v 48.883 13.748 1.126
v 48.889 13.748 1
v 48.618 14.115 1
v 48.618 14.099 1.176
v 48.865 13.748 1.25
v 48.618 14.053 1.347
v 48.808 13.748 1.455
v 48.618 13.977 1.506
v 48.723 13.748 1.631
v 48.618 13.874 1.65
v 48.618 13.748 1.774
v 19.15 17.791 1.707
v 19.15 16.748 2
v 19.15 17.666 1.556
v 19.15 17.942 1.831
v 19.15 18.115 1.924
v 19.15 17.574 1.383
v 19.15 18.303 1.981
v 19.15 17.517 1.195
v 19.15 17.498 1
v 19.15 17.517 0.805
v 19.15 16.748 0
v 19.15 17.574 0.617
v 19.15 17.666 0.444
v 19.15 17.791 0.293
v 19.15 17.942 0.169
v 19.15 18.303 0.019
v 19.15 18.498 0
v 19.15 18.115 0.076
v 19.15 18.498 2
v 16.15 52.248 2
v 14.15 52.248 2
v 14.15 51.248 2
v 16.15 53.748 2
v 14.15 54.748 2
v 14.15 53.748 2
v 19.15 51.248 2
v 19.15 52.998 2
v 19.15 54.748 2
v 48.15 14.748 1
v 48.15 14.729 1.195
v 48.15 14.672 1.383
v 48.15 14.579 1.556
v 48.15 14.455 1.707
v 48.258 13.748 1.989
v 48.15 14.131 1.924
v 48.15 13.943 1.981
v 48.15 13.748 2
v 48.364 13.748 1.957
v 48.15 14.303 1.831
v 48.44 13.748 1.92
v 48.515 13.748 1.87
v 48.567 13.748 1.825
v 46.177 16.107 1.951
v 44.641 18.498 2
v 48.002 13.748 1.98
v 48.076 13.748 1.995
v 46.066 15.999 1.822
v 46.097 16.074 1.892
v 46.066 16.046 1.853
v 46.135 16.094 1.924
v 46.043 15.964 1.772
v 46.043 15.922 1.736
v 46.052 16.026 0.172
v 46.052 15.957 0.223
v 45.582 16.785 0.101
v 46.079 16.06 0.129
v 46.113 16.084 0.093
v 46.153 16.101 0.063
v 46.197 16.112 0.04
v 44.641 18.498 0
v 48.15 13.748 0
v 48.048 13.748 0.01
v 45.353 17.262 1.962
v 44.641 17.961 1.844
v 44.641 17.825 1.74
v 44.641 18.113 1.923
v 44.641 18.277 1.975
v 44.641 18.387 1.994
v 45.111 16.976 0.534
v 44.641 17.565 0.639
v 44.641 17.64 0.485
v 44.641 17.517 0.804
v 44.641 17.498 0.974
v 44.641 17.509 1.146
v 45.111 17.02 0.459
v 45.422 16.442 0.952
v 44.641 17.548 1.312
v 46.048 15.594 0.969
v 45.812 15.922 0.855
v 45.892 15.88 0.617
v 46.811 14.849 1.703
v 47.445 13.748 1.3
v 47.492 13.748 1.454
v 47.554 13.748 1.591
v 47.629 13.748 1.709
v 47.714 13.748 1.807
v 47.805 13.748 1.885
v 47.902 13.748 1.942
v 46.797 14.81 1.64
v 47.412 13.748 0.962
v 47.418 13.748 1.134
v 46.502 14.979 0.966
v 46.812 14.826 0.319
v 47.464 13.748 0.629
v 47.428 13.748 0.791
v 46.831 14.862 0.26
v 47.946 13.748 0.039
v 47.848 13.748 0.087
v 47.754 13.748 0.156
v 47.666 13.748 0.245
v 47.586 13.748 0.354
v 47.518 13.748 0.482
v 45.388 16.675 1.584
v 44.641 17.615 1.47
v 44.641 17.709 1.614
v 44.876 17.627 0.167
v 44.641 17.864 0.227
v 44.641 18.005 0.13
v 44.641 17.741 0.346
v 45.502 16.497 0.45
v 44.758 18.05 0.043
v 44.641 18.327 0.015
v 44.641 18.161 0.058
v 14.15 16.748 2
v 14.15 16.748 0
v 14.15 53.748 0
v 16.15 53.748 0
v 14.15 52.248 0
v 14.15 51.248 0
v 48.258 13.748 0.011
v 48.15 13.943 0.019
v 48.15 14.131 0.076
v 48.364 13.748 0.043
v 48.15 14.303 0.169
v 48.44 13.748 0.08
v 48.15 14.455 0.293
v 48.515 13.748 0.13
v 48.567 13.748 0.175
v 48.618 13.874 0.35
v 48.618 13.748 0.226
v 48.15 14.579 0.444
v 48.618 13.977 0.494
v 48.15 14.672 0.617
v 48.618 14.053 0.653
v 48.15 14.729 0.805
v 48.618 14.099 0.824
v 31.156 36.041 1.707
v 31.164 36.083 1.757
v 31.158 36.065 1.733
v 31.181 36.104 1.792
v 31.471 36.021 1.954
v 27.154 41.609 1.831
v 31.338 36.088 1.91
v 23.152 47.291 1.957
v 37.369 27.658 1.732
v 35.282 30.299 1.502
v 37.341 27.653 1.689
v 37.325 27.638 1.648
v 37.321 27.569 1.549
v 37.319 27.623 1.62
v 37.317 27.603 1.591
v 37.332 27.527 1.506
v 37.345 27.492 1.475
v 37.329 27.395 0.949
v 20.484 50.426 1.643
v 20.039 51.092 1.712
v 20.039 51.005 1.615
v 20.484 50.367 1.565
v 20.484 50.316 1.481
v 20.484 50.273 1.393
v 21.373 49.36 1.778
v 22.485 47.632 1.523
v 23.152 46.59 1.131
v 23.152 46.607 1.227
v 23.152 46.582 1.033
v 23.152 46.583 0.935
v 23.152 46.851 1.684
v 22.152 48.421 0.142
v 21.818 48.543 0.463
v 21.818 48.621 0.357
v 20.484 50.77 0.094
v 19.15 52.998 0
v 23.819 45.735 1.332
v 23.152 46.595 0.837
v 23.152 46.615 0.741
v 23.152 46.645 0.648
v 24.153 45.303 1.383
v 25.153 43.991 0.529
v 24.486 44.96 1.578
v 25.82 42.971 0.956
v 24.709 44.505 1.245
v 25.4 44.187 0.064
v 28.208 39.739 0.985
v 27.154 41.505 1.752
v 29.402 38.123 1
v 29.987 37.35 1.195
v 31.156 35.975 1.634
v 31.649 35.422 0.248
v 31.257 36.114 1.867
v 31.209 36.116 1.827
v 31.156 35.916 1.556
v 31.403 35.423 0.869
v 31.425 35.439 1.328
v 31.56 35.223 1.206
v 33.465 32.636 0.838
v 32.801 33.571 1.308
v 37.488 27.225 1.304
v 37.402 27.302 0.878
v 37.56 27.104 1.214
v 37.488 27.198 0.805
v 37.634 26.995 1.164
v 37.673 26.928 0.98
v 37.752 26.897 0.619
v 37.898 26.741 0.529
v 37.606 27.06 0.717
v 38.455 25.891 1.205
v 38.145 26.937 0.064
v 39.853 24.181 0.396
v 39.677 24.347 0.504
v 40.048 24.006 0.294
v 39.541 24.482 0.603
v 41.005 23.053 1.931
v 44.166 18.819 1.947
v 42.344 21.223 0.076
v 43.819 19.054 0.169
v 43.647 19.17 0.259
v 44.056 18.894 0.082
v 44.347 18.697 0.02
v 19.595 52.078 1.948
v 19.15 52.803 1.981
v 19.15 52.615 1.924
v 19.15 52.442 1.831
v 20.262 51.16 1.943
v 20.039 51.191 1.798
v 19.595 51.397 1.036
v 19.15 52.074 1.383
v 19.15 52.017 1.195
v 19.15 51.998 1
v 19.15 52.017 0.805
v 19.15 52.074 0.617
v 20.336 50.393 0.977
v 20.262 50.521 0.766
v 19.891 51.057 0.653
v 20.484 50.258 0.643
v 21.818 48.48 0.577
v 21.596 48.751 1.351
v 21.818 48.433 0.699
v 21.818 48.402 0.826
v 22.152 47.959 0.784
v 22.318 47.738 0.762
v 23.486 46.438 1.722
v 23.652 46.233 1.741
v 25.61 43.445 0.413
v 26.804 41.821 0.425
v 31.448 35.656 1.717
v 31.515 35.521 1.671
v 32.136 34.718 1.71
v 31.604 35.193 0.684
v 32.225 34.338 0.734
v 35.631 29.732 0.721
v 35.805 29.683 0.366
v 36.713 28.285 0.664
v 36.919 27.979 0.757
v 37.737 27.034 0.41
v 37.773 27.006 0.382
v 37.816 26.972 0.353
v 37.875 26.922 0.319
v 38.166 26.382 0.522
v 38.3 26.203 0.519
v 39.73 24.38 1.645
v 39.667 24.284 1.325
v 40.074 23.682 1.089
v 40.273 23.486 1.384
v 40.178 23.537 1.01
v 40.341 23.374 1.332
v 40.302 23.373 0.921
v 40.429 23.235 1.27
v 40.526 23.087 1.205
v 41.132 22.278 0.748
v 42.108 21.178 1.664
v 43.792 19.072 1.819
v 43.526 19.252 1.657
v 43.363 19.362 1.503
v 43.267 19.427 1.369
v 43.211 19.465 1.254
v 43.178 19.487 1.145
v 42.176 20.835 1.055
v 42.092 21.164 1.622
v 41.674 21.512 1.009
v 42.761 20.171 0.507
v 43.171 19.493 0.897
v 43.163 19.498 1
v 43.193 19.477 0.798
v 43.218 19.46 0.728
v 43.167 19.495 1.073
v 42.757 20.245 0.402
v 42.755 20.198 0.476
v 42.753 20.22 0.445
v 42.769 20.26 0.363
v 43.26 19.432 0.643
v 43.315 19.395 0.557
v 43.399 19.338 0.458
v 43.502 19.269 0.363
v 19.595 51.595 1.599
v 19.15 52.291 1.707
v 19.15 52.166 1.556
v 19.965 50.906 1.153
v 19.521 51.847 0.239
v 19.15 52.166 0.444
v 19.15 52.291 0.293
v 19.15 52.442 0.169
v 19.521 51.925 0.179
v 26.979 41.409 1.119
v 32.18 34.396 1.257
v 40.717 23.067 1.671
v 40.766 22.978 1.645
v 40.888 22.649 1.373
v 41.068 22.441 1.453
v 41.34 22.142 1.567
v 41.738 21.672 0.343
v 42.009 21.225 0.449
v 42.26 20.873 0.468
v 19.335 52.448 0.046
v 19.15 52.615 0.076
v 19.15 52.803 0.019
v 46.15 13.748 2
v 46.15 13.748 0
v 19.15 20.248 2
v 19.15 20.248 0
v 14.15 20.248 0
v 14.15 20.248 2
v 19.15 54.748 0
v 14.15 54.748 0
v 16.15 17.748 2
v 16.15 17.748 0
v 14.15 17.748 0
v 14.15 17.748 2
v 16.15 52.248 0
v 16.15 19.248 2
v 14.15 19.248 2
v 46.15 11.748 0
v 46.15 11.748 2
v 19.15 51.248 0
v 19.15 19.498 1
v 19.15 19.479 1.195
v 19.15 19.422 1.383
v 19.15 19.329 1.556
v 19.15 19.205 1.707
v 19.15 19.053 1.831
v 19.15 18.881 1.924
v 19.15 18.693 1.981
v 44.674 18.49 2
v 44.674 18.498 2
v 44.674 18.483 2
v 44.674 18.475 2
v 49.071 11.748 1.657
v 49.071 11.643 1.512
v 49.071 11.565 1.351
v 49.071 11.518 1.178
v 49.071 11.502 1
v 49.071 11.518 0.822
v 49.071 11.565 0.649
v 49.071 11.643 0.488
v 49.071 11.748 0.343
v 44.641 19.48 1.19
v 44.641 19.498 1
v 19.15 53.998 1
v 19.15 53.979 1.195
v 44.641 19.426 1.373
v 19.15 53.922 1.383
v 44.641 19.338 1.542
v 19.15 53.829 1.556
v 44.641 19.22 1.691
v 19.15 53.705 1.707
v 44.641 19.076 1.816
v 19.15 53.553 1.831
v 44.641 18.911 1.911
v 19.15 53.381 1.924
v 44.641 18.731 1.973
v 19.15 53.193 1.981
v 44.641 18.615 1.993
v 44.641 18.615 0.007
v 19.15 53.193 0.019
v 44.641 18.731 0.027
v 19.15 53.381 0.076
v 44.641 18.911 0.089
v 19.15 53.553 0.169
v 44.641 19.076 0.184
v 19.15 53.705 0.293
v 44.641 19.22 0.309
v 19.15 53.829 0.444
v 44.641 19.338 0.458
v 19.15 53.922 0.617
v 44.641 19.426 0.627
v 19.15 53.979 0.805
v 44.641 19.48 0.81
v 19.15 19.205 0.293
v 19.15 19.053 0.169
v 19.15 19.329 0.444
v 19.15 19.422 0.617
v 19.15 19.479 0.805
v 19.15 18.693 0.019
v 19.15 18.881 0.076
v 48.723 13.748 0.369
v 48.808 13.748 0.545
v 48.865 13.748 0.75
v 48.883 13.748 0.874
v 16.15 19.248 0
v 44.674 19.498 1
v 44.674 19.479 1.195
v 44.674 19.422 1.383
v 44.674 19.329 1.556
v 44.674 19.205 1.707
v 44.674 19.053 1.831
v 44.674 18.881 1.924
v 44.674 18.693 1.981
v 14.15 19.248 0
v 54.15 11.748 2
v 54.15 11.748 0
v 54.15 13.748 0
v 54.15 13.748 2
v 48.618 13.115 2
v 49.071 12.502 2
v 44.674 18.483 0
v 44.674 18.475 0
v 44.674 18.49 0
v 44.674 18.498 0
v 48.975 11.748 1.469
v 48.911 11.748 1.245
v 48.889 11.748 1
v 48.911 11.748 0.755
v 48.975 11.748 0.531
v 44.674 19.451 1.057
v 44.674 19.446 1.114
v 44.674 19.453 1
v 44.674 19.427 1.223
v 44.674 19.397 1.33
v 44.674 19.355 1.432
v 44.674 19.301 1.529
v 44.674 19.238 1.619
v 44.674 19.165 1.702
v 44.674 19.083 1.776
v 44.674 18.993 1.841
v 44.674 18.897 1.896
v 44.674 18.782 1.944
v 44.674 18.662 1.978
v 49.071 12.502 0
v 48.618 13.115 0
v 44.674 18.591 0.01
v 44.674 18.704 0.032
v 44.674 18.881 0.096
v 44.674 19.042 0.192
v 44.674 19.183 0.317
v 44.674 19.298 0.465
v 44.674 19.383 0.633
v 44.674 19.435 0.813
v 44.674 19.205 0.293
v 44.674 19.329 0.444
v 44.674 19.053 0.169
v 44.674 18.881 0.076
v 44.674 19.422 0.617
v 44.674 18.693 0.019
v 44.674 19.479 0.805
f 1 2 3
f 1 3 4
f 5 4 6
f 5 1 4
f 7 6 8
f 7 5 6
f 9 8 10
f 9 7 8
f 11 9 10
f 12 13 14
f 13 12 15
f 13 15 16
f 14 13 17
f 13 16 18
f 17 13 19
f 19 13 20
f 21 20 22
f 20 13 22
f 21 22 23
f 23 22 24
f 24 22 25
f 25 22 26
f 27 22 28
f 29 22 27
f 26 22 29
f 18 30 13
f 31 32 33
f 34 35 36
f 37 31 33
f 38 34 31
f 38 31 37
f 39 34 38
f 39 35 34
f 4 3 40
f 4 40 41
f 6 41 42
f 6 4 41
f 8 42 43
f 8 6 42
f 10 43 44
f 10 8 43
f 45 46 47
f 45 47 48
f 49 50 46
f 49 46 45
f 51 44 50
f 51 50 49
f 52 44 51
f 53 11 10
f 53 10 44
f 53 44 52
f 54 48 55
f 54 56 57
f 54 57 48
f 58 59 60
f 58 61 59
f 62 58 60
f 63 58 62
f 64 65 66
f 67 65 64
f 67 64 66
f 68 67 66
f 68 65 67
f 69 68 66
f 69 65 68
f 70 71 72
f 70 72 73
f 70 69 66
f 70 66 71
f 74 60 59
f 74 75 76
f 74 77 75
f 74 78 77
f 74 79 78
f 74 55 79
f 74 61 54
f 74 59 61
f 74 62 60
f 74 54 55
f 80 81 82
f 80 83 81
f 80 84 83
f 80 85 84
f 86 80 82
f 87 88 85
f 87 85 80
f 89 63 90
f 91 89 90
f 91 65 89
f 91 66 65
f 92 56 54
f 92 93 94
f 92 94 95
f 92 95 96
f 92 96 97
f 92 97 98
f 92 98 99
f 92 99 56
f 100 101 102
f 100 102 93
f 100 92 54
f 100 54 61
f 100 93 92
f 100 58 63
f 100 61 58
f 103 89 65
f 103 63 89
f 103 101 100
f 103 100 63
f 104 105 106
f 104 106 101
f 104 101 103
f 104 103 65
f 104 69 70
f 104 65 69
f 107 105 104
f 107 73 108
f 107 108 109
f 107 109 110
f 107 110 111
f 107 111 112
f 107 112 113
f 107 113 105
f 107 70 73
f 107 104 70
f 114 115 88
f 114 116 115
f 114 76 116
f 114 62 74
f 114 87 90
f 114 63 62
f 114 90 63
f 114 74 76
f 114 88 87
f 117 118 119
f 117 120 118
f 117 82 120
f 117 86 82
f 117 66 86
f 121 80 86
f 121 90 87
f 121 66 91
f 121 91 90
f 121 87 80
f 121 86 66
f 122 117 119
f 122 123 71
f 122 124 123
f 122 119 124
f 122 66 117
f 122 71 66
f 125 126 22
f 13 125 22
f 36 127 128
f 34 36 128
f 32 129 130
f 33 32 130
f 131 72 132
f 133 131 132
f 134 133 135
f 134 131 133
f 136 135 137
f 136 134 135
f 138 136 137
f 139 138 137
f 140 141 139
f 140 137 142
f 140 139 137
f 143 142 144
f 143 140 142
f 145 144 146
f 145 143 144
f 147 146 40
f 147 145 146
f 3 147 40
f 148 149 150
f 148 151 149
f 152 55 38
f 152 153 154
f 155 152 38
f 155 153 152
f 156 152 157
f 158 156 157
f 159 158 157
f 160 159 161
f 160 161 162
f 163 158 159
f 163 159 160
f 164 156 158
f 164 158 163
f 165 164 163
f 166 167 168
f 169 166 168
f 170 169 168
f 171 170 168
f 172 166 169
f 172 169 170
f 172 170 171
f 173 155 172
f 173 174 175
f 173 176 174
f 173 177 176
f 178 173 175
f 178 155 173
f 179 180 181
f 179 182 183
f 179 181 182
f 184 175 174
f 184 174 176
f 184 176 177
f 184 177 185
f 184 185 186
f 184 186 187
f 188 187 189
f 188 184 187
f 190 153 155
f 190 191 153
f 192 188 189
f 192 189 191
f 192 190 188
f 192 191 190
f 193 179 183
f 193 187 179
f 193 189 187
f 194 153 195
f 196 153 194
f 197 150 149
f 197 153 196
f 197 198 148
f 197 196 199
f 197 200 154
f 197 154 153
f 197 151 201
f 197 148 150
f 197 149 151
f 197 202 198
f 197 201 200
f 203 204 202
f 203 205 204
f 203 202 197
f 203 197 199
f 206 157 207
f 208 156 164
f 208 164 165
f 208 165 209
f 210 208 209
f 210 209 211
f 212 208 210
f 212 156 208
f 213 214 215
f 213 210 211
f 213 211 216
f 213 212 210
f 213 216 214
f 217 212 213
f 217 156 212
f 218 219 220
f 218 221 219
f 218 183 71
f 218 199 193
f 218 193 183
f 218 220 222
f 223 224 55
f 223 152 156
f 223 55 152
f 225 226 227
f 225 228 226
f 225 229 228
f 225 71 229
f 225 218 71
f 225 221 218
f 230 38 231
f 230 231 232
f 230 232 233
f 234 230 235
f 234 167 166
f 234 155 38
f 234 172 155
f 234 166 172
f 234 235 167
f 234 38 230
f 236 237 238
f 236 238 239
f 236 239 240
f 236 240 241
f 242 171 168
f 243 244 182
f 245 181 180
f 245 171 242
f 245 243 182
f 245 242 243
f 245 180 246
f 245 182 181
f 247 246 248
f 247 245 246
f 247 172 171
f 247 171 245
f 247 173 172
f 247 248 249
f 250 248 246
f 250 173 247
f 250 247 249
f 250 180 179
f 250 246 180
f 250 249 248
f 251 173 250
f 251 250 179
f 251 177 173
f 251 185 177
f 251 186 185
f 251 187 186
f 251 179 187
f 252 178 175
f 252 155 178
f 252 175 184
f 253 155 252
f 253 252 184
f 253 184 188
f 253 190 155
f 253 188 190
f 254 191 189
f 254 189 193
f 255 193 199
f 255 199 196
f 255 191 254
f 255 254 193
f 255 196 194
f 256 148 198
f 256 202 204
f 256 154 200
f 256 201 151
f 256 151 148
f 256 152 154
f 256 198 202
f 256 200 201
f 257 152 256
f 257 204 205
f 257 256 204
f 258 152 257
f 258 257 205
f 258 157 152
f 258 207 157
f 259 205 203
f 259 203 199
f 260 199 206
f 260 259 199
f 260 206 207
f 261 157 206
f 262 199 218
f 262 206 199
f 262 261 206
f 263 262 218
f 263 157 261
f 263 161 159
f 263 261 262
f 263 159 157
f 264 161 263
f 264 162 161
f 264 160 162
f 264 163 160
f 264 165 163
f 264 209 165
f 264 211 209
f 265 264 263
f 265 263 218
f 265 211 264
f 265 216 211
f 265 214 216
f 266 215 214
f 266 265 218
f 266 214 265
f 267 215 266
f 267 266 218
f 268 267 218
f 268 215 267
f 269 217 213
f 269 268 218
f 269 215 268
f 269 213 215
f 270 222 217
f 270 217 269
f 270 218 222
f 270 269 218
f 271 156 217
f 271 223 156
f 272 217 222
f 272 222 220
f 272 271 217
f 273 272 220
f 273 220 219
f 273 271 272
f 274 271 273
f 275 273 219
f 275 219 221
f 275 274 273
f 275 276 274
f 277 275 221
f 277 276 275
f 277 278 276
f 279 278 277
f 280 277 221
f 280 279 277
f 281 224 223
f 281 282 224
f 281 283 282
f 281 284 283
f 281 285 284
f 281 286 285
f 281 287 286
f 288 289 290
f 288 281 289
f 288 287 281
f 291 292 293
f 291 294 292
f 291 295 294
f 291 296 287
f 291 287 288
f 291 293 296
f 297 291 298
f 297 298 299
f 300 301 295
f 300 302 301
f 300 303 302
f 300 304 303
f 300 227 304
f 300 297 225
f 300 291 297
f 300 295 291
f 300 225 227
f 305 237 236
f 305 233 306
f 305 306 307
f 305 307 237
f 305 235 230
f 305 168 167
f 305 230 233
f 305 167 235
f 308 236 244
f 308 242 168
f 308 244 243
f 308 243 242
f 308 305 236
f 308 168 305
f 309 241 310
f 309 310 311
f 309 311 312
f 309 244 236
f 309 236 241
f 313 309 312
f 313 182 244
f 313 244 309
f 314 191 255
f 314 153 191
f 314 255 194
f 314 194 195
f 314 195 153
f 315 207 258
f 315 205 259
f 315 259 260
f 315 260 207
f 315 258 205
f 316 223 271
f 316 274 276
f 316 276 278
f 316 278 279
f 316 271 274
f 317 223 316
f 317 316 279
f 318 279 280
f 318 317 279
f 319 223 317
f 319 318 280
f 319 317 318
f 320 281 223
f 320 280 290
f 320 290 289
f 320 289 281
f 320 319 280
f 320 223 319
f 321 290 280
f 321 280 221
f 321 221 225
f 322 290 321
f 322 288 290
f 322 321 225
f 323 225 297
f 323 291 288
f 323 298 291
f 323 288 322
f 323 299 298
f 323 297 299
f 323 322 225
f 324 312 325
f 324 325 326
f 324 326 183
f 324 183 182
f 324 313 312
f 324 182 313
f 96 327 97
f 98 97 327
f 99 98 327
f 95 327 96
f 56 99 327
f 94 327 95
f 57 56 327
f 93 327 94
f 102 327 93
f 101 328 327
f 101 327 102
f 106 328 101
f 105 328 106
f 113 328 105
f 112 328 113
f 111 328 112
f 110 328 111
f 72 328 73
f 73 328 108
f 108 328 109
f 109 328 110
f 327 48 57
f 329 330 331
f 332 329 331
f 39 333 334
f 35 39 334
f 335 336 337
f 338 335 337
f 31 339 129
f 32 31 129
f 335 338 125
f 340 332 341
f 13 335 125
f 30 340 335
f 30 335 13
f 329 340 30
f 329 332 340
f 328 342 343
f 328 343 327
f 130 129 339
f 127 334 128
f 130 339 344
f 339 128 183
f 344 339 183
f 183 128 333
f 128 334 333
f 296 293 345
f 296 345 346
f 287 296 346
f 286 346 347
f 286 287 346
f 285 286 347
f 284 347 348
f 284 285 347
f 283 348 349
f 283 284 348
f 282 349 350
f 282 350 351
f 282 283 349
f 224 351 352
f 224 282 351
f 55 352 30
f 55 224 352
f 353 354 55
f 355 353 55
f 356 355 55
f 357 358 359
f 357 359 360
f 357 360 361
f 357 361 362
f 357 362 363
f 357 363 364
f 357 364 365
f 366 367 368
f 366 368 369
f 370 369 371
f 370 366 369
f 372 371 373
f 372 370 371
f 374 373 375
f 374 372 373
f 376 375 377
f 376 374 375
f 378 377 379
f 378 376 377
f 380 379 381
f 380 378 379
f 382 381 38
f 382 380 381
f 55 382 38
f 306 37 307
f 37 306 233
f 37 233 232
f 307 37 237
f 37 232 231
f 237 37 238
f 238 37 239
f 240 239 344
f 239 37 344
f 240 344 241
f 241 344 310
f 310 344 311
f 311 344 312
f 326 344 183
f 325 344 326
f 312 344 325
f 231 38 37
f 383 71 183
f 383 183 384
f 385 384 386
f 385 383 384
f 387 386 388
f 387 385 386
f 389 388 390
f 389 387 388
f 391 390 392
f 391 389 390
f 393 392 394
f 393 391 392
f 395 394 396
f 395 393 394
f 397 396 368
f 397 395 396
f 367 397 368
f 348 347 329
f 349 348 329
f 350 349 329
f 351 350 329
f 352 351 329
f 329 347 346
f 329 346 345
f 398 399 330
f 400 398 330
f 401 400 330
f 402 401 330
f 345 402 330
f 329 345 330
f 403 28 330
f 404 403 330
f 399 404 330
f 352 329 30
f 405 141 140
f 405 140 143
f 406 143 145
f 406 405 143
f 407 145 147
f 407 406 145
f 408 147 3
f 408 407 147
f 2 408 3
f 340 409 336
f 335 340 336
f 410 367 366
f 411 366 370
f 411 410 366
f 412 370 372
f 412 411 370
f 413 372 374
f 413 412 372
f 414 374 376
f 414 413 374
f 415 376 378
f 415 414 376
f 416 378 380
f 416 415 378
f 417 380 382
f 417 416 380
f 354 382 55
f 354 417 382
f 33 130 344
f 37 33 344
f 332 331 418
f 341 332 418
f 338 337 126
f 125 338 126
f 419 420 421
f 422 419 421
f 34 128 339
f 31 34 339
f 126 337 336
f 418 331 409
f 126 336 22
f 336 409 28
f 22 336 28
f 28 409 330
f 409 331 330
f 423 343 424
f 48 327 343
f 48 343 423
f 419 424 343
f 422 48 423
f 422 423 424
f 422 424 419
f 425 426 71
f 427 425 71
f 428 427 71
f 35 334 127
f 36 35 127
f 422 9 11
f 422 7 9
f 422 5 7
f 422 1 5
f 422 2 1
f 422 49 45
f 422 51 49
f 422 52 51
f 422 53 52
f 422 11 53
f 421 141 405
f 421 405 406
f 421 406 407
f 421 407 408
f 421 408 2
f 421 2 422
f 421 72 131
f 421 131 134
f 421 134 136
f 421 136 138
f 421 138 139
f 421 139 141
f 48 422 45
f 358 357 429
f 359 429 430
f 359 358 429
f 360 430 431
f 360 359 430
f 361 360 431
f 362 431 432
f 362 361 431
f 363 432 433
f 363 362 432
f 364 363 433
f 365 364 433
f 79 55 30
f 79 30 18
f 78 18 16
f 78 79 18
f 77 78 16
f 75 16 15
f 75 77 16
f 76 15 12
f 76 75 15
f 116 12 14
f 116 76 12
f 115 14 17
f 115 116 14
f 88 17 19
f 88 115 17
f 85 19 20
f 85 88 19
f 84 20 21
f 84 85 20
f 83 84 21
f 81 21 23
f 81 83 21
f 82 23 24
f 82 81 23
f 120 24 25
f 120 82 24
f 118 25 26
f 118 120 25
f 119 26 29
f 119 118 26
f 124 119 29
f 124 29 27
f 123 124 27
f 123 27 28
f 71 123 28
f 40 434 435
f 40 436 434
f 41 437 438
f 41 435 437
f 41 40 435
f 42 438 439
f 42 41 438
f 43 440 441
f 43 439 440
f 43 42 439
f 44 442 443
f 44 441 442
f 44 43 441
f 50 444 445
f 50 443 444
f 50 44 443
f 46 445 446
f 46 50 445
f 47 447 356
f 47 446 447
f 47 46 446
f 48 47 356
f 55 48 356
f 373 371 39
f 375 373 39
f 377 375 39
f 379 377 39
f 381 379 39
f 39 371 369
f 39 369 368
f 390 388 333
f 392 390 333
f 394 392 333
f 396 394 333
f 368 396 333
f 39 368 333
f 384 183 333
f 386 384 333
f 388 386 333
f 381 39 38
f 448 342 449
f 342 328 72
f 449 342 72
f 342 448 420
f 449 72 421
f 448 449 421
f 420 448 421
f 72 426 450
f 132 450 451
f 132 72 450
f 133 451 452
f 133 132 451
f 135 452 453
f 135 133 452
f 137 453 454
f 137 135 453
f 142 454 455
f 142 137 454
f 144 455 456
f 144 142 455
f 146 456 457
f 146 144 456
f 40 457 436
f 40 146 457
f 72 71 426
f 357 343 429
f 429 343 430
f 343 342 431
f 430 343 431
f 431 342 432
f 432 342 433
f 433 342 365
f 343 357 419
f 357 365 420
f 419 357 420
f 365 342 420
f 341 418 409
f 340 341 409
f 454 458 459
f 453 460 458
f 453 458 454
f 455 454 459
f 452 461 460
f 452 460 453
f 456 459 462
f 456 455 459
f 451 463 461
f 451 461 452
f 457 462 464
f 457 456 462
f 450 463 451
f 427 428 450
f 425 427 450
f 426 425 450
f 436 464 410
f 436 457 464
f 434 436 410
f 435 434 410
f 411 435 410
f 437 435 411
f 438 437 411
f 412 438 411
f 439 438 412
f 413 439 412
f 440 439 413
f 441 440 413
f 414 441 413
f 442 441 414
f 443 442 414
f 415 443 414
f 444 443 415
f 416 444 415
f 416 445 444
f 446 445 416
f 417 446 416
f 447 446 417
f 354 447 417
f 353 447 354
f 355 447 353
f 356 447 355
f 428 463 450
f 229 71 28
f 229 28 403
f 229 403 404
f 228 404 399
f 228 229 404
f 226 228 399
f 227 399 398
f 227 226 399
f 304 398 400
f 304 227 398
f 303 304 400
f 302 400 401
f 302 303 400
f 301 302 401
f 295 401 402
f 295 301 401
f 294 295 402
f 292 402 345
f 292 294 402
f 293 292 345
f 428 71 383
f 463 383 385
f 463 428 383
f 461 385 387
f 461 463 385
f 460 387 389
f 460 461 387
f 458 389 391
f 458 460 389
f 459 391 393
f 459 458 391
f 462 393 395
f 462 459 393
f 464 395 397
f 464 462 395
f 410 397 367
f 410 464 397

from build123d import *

# Parameters (mm, degrees)
F1_DEPTH = 2
F0_W     = 8
F0_H     = 2
F3_DEPTH = 2


with BuildPart() as f1:
    # F0 (on Top) → F1 (new body)
    with BuildSketch(Plane.XY):
        Polygon((19.1500553724, 54.7478544891), (14.1500553724, 54.7478544891), (14.1500553724, 53.7478544891), (16.1500553724, 53.7478544891), (16.1500553724, 52.2478544891), (14.1500553724, 52.2478544891), (14.1500553724, 51.2478544891), (19.1500553724, 51.2478544891), align=None)
    extrude(amount=F1_DEPTH)

    # F0 (on Top) → F3 (join)
    with BuildSketch(Plane.XY):
        Polygon((19.1500553724, 54.7478544891), (14.1500553724, 54.7478544891), (14.1500553724, 53.7478544891), (16.1500553724, 53.7478544891), (16.1500553724, 52.2478544891), (14.1500553724, 52.2478544891), (14.1500553724, 51.2478544891), (19.1500553724, 51.2478544891), align=None)
    extrude(amount=F3_DEPTH)



with BuildPart() as f1b:
    # F0 (on Top) → F1, piece 2 (new body)
    with BuildSketch(Plane.XY):
        Polygon((14.1500553724, 16.7478544891), (19.1500553724, 16.7478544891), (19.1500553724, 20.2478544891), (14.1500553724, 20.2478544891), (14.1500553724, 19.2478544891), (16.1500553724, 19.2478544891), (16.1500553724, 17.7478544891), (14.1500553724, 17.7478544891), align=None)
    extrude(amount=F1_DEPTH)

    # F0 (on Top) → F3, piece 2 (join)
    with BuildSketch(Plane.XY):
        Polygon((14.1500553724, 16.7478544891), (19.1500553724, 16.7478544891), (19.1500553724, 20.2478544891), (14.1500553724, 20.2478544891), (14.1500553724, 19.2478544891), (16.1500553724, 19.2478544891), (16.1500553724, 17.7478544891), (14.1500553724, 17.7478544891), align=None)
    extrude(amount=F3_DEPTH)


with BuildPart() as f1c:
    # F0 (on Top) → F1, piece 3 (new body)
    with BuildSketch(Plane.XY):
        with Locations((50.1500553724, 12.7478544891)):
            Rectangle(F0_W, F0_H)
    extrude(amount=F1_DEPTH)

    # F0 (on Top) → F3, piece 3 (join)
    with BuildSketch(Plane.XY):
        with Locations((50.1500553724, 12.7478544891)):
            Rectangle(F0_W, F0_H)
    extrude(amount=F3_DEPTH)


with BuildPart() as f1_1:
    add(f1.part)

    add(f1c.part)  # F8 merges F1c
    # F8: sweep along a path in F7
    with BuildLine(Plane.XY.offset(1)) as f8_path:
        Line((19.1500553724, 52.9978544891), (48.1500553724, 13.7478544891))
        Line((48.1500553724, 13.7478544891), (48.6178682598, 13.1146939432))
        Line((48.6178682598, 13.1146939432), (49.0708957451, 12.5015446744))
    # F4 (on face) → F8 (sweep)
    with BuildSketch(Plane.YZ.offset(19.1500553724)):
        with BuildLine():
            ThreePointArc((52.9978544891, 0), (53.7049612703, 0.2928932188), (53.9978544891, 1))
            ThreePointArc((53.9978544891, 1), (53.7049612703, 1.7071067812), (52.9978544891, 2))
            ThreePointArc((52.9978544891, 2), (51.9978544891, 1), (52.9978544891, 0))
        make_face()
    sweep(path=f8_path.line)


    add(f1b.part)  # F10 merges F1b
    # F10: sweep along a path in F9
    with BuildLine(Plane.XY.offset(1)) as f10_path:
        Line((19.1500553724, 18.4978544891), (44.6739457548, 18.4978544891))
    # F5 (on face) → F10 (sweep)
    with BuildSketch(Plane.YZ.offset(19.1500553724)):
        with BuildLine():
            ThreePointArc((18.4978544891, 0), (19.2049612703, 0.2928932188), (19.4978544891, 1))
            ThreePointArc((19.4978544891, 1), (19.2049612703, 1.7071067812), (18.4978544891, 2))
            ThreePointArc((18.4978544891, 2), (17.4978544891, 1), (18.4978544891, 0))
        make_face()
    sweep(path=f10_path.line)


solid = f1_1.part
